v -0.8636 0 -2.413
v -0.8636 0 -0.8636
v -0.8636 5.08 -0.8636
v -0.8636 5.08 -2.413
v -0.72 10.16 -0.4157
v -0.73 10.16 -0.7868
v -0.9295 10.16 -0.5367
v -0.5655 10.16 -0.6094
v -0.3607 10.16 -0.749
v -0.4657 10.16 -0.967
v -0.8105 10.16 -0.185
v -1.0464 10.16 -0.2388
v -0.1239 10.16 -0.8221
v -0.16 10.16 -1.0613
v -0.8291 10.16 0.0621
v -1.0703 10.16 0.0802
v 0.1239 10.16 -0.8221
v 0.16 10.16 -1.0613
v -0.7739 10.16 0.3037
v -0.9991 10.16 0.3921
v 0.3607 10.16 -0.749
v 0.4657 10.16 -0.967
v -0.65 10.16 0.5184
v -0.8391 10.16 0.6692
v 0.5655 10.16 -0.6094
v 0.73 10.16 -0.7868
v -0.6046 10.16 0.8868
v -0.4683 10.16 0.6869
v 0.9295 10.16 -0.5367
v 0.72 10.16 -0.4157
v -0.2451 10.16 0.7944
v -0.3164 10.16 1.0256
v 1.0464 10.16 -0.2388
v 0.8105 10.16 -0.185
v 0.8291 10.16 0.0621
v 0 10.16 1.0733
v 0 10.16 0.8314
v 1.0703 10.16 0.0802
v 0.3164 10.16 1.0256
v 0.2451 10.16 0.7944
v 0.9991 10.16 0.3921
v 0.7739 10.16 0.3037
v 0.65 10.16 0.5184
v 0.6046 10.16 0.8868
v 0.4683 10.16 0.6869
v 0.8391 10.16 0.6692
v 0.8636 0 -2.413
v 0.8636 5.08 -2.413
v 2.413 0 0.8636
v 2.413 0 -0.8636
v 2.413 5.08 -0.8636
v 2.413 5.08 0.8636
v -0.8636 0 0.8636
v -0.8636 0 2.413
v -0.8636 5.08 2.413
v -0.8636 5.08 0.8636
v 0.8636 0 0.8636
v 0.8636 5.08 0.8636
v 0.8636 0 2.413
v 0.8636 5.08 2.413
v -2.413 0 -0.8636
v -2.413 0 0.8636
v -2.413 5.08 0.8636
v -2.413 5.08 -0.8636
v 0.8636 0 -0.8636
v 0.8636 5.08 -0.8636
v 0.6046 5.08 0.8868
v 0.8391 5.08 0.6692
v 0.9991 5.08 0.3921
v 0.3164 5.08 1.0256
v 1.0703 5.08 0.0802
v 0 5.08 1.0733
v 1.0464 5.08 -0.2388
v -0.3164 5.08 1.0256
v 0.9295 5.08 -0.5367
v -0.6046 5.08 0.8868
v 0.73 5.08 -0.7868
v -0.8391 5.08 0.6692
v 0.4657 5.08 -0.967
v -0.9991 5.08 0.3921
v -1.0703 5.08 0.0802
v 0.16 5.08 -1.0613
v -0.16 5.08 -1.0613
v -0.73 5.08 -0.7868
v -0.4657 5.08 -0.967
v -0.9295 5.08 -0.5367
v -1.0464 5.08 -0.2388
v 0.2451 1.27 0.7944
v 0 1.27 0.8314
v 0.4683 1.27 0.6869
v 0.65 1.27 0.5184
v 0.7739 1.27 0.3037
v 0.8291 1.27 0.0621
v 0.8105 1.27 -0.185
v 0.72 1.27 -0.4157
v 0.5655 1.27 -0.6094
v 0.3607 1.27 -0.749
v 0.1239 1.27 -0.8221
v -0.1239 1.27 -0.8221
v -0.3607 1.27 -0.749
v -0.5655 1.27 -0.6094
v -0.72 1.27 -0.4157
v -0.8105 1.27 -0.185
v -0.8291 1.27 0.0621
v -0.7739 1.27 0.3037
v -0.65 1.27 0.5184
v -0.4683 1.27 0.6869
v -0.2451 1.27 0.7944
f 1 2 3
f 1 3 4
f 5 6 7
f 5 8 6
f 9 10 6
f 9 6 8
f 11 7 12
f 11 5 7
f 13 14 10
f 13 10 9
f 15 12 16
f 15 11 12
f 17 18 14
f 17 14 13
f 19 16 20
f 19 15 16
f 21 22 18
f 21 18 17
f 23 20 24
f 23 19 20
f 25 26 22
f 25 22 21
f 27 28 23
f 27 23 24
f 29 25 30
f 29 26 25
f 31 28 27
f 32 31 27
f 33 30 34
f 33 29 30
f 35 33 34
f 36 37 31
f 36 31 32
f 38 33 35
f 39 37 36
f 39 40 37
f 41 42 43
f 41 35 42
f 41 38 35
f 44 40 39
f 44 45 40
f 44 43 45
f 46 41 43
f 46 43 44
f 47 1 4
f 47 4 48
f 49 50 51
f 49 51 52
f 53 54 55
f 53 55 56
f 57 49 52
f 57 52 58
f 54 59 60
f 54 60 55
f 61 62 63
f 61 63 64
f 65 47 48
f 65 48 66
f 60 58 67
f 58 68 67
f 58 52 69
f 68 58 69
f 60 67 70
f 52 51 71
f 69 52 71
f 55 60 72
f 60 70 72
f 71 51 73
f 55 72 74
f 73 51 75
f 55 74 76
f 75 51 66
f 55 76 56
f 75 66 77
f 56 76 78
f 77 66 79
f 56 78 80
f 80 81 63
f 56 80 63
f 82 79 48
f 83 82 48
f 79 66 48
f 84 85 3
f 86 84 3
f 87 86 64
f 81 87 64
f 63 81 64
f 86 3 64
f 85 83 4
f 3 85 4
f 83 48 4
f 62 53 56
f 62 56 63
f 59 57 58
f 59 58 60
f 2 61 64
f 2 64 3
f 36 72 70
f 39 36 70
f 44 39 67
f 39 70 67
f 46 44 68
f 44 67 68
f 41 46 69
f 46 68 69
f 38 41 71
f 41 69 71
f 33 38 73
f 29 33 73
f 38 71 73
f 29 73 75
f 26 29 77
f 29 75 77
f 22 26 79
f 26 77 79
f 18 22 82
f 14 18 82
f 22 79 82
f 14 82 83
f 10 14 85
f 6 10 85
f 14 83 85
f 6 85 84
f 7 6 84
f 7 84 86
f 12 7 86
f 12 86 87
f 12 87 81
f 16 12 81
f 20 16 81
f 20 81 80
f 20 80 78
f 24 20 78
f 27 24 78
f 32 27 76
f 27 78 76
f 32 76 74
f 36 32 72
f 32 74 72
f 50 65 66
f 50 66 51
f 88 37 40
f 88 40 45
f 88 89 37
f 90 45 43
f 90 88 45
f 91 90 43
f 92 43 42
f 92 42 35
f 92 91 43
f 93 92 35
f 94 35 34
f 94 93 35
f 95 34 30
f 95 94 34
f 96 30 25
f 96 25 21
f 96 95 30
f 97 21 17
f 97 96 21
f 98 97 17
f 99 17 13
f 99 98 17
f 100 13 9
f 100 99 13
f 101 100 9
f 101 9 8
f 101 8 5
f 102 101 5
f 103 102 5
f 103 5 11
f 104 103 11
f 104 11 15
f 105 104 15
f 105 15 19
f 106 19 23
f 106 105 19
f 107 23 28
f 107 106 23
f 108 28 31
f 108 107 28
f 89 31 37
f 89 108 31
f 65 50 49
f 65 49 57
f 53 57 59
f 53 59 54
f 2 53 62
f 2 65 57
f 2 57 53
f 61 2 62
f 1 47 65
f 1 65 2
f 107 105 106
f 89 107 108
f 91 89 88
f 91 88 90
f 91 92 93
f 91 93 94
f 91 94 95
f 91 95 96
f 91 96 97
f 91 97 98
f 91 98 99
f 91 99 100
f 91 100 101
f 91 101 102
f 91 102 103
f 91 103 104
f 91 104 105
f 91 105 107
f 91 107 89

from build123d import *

# Parameters (mm, degrees)
BOSS_EXTRUDE1_DEPTH = 5.08
SKETCH2_R           = 1.073303583
SKETCH2_R_2         = 0.831378849
BOSS_EXTRUDE2_DEPTH = 5.08
CUT_EXTRUDE1_START  = -3.81
SKETCH4_R           = 0.831378849
CUT_EXTRUDE1_DEPTH  = 3.81


with BuildPart() as part:
    # Sketch1 → Boss-Extrude1 (new body)
    with BuildSketch(Plane(origin=(0, 0, 0), x_dir=(1, 0, 0), z_dir=(0, 1, 0))):
        Polygon((0.8636, 0.8636), (2.413, 0.8636), (2.413, -0.8636), (0.8636, -0.8636), (0.8636, -2.413), (-0.8636, -2.413), (-0.8636, -0.8636), (-2.413, -0.8636), (-2.413, 0.8636), (-0.8636, 0.8636), (-0.8636, 2.413), (0.8636, 2.413), align=None)
    extrude(amount=BOSS_EXTRUDE1_DEPTH)

    # Sketch2 → Boss-Extrude2 (add)
    with BuildSketch(Plane(origin=(0, 5.08, 0), x_dir=(1, 0, 0), z_dir=(0, 1, 0))):
        with Locations(Location((0, 0, 0), (0, 0, 270))):
            Circle(SKETCH2_R)
        with Locations(Location((0, 0, 0), (0, 0, 270))):
            Circle(SKETCH2_R_2, mode=Mode.SUBTRACT)
    extrude(amount=BOSS_EXTRUDE2_DEPTH)

    # Sketch4 → Cut-Extrude1 (cut)
    with BuildSketch(Plane(origin=(0, 5.08, 0), x_dir=(1, 0, 0), z_dir=(0, 1, 0)).offset(CUT_EXTRUDE1_START)):
        with Locations(Location((0, 0, 0), (0, 0, 270))):
            Circle(SKETCH4_R)
    extrude(amount=CUT_EXTRUDE1_DEPTH, mode=Mode.SUBTRACT)


solid = part.part
